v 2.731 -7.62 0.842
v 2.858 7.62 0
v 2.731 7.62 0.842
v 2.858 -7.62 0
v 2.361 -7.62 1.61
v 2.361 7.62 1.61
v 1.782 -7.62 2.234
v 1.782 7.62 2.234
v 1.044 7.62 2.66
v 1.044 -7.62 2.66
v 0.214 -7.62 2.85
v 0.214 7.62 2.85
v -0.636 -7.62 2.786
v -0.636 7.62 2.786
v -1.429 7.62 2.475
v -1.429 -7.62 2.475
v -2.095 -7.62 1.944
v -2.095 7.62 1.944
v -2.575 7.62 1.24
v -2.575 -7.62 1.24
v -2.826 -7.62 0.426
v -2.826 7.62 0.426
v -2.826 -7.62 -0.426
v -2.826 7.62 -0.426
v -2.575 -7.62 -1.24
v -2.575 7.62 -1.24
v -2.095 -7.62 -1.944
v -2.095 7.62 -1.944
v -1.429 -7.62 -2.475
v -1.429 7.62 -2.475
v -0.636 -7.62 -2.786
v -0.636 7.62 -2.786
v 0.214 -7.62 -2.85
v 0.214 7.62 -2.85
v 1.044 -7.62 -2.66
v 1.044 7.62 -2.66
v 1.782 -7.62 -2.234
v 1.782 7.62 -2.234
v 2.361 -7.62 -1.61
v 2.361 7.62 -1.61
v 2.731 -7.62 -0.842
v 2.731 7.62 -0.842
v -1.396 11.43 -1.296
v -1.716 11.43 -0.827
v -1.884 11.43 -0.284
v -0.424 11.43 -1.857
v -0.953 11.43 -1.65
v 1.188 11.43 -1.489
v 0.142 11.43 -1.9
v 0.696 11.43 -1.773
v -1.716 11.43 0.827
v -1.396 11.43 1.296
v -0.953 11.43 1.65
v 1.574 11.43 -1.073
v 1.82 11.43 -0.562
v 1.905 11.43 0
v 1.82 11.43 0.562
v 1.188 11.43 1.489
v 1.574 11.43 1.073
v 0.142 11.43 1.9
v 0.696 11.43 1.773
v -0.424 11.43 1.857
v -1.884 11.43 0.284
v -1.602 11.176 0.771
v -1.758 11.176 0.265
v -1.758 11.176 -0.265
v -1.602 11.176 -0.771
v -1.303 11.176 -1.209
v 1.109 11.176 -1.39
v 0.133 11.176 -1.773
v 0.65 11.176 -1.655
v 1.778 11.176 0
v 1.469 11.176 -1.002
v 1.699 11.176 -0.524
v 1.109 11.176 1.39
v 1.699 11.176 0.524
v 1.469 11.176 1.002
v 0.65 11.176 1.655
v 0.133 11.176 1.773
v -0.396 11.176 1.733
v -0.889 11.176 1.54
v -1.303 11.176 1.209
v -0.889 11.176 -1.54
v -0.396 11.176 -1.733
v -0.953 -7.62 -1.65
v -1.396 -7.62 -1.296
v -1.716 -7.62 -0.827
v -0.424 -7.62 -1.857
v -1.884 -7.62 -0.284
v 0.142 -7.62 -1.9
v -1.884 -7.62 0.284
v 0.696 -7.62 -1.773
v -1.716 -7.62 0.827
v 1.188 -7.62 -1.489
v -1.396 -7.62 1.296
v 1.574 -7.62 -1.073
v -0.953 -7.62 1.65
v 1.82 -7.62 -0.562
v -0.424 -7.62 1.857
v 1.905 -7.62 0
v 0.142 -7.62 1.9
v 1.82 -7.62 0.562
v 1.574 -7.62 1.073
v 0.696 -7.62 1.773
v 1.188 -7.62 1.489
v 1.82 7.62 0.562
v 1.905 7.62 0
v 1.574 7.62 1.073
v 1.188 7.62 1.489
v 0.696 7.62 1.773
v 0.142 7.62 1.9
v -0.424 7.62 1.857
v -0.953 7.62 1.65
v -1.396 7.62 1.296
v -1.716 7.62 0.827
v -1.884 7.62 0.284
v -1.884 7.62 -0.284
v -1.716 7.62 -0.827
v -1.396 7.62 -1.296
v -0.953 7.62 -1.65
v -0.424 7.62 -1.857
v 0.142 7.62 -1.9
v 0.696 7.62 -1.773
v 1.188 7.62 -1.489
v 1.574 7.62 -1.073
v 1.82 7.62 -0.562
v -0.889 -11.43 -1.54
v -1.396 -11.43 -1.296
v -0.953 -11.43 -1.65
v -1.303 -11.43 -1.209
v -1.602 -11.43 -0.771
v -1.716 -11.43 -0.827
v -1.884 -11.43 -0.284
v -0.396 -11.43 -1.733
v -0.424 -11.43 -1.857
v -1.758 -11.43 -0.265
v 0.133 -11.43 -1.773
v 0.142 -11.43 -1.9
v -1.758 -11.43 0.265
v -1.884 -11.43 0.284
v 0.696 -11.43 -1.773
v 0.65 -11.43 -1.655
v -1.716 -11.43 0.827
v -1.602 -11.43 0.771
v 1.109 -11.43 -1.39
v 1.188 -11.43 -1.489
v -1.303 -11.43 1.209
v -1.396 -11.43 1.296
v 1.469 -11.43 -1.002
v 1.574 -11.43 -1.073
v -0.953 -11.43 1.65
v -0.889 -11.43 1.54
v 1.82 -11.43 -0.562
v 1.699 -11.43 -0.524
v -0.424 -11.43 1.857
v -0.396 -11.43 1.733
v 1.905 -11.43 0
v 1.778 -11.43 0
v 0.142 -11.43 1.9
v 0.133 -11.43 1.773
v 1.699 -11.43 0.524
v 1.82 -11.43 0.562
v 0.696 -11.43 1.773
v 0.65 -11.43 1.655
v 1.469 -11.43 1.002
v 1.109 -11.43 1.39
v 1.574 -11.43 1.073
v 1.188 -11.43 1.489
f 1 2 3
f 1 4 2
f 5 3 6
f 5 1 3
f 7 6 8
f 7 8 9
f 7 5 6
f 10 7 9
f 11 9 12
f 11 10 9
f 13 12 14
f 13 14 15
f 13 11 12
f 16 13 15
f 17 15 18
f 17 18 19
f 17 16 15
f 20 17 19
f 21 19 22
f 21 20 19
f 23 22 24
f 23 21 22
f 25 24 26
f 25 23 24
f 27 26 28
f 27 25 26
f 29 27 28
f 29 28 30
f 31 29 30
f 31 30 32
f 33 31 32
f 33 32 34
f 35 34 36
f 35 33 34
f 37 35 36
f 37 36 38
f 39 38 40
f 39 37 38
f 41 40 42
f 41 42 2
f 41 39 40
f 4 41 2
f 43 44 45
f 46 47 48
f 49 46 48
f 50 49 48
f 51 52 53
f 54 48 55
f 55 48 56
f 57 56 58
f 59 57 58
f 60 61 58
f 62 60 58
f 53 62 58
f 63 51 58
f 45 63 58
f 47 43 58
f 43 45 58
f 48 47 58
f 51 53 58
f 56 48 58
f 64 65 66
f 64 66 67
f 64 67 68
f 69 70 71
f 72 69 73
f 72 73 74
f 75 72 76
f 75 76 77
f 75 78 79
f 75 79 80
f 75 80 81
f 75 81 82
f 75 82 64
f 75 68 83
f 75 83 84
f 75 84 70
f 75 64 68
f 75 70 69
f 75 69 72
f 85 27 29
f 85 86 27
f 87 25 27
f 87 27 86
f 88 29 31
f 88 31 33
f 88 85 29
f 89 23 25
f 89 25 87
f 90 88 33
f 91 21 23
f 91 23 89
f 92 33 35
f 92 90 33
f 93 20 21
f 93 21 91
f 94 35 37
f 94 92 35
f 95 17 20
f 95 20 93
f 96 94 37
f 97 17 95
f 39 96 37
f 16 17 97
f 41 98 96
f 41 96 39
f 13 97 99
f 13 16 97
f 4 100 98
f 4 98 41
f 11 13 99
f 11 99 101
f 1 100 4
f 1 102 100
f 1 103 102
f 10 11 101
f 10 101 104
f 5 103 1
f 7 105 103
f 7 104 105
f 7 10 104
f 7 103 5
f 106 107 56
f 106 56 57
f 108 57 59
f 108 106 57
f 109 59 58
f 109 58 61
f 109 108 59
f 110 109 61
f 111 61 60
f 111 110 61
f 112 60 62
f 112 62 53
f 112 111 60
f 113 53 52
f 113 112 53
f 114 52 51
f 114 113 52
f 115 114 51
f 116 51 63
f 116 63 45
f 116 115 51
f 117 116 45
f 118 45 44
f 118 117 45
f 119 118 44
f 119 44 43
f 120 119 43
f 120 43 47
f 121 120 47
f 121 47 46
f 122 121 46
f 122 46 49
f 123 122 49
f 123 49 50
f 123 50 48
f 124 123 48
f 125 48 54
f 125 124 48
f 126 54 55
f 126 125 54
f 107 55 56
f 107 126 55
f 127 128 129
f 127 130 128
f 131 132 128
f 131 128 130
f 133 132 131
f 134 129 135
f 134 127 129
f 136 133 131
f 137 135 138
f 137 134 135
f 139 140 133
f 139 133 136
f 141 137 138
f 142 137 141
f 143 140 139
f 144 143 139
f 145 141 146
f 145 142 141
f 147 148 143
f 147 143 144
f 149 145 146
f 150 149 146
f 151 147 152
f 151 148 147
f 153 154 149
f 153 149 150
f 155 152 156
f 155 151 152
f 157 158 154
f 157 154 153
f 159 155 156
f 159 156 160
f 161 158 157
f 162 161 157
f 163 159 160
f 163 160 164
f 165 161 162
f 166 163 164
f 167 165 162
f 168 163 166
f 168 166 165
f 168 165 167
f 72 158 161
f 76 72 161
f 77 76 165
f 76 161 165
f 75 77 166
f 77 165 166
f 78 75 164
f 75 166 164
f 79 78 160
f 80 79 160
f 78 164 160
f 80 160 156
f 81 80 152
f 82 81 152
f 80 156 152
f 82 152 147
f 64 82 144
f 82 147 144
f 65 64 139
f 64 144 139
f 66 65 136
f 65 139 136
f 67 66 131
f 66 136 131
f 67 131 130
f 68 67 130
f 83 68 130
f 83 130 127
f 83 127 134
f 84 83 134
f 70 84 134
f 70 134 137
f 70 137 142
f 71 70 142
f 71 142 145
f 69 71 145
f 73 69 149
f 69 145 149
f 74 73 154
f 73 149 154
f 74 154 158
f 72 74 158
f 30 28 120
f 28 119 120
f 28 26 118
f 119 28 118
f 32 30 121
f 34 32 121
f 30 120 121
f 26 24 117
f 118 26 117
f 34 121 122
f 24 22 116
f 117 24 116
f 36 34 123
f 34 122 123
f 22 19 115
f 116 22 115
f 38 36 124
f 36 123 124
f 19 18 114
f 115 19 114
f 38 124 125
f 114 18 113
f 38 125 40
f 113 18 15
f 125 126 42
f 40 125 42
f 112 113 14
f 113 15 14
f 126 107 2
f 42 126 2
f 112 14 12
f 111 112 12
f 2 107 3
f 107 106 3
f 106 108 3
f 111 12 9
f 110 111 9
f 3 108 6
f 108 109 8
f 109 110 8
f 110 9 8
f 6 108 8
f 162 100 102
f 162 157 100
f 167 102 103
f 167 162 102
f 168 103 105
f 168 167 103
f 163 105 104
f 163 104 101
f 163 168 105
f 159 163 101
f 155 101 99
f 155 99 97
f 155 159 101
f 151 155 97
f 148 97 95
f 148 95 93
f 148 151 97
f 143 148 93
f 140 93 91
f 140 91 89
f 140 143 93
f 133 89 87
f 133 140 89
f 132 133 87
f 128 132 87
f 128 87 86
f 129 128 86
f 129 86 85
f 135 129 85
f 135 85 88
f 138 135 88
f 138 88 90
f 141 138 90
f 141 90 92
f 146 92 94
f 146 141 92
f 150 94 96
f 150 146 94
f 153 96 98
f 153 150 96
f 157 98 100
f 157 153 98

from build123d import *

# Parameters (mm, degrees)
F0_R     = 2.8575
F1_DEPTH = 7.62
F2_R     = 1.905
F3_DEPTH = 11.43
F4_R     = 1.778
F5_DEPTH = 22.606


with BuildPart() as f1:
    # F0 (on Front) → F1 (new body, symmetric)
    with BuildSketch(Plane.XZ):
        Circle(F0_R)
    extrude(amount=F1_DEPTH, both=True)

    # F2 (on Front) → F3 (join, symmetric)
    with BuildSketch(Plane.XZ):
        Circle(F2_R)
    extrude(amount=F3_DEPTH, both=True)

    # F4 (on face) → F5 (cut)
    with BuildSketch(Plane.XZ.offset(11.43)):
        Circle(F4_R)
    extrude(amount=-F5_DEPTH, mode=Mode.SUBTRACT)


solid = f1.part
